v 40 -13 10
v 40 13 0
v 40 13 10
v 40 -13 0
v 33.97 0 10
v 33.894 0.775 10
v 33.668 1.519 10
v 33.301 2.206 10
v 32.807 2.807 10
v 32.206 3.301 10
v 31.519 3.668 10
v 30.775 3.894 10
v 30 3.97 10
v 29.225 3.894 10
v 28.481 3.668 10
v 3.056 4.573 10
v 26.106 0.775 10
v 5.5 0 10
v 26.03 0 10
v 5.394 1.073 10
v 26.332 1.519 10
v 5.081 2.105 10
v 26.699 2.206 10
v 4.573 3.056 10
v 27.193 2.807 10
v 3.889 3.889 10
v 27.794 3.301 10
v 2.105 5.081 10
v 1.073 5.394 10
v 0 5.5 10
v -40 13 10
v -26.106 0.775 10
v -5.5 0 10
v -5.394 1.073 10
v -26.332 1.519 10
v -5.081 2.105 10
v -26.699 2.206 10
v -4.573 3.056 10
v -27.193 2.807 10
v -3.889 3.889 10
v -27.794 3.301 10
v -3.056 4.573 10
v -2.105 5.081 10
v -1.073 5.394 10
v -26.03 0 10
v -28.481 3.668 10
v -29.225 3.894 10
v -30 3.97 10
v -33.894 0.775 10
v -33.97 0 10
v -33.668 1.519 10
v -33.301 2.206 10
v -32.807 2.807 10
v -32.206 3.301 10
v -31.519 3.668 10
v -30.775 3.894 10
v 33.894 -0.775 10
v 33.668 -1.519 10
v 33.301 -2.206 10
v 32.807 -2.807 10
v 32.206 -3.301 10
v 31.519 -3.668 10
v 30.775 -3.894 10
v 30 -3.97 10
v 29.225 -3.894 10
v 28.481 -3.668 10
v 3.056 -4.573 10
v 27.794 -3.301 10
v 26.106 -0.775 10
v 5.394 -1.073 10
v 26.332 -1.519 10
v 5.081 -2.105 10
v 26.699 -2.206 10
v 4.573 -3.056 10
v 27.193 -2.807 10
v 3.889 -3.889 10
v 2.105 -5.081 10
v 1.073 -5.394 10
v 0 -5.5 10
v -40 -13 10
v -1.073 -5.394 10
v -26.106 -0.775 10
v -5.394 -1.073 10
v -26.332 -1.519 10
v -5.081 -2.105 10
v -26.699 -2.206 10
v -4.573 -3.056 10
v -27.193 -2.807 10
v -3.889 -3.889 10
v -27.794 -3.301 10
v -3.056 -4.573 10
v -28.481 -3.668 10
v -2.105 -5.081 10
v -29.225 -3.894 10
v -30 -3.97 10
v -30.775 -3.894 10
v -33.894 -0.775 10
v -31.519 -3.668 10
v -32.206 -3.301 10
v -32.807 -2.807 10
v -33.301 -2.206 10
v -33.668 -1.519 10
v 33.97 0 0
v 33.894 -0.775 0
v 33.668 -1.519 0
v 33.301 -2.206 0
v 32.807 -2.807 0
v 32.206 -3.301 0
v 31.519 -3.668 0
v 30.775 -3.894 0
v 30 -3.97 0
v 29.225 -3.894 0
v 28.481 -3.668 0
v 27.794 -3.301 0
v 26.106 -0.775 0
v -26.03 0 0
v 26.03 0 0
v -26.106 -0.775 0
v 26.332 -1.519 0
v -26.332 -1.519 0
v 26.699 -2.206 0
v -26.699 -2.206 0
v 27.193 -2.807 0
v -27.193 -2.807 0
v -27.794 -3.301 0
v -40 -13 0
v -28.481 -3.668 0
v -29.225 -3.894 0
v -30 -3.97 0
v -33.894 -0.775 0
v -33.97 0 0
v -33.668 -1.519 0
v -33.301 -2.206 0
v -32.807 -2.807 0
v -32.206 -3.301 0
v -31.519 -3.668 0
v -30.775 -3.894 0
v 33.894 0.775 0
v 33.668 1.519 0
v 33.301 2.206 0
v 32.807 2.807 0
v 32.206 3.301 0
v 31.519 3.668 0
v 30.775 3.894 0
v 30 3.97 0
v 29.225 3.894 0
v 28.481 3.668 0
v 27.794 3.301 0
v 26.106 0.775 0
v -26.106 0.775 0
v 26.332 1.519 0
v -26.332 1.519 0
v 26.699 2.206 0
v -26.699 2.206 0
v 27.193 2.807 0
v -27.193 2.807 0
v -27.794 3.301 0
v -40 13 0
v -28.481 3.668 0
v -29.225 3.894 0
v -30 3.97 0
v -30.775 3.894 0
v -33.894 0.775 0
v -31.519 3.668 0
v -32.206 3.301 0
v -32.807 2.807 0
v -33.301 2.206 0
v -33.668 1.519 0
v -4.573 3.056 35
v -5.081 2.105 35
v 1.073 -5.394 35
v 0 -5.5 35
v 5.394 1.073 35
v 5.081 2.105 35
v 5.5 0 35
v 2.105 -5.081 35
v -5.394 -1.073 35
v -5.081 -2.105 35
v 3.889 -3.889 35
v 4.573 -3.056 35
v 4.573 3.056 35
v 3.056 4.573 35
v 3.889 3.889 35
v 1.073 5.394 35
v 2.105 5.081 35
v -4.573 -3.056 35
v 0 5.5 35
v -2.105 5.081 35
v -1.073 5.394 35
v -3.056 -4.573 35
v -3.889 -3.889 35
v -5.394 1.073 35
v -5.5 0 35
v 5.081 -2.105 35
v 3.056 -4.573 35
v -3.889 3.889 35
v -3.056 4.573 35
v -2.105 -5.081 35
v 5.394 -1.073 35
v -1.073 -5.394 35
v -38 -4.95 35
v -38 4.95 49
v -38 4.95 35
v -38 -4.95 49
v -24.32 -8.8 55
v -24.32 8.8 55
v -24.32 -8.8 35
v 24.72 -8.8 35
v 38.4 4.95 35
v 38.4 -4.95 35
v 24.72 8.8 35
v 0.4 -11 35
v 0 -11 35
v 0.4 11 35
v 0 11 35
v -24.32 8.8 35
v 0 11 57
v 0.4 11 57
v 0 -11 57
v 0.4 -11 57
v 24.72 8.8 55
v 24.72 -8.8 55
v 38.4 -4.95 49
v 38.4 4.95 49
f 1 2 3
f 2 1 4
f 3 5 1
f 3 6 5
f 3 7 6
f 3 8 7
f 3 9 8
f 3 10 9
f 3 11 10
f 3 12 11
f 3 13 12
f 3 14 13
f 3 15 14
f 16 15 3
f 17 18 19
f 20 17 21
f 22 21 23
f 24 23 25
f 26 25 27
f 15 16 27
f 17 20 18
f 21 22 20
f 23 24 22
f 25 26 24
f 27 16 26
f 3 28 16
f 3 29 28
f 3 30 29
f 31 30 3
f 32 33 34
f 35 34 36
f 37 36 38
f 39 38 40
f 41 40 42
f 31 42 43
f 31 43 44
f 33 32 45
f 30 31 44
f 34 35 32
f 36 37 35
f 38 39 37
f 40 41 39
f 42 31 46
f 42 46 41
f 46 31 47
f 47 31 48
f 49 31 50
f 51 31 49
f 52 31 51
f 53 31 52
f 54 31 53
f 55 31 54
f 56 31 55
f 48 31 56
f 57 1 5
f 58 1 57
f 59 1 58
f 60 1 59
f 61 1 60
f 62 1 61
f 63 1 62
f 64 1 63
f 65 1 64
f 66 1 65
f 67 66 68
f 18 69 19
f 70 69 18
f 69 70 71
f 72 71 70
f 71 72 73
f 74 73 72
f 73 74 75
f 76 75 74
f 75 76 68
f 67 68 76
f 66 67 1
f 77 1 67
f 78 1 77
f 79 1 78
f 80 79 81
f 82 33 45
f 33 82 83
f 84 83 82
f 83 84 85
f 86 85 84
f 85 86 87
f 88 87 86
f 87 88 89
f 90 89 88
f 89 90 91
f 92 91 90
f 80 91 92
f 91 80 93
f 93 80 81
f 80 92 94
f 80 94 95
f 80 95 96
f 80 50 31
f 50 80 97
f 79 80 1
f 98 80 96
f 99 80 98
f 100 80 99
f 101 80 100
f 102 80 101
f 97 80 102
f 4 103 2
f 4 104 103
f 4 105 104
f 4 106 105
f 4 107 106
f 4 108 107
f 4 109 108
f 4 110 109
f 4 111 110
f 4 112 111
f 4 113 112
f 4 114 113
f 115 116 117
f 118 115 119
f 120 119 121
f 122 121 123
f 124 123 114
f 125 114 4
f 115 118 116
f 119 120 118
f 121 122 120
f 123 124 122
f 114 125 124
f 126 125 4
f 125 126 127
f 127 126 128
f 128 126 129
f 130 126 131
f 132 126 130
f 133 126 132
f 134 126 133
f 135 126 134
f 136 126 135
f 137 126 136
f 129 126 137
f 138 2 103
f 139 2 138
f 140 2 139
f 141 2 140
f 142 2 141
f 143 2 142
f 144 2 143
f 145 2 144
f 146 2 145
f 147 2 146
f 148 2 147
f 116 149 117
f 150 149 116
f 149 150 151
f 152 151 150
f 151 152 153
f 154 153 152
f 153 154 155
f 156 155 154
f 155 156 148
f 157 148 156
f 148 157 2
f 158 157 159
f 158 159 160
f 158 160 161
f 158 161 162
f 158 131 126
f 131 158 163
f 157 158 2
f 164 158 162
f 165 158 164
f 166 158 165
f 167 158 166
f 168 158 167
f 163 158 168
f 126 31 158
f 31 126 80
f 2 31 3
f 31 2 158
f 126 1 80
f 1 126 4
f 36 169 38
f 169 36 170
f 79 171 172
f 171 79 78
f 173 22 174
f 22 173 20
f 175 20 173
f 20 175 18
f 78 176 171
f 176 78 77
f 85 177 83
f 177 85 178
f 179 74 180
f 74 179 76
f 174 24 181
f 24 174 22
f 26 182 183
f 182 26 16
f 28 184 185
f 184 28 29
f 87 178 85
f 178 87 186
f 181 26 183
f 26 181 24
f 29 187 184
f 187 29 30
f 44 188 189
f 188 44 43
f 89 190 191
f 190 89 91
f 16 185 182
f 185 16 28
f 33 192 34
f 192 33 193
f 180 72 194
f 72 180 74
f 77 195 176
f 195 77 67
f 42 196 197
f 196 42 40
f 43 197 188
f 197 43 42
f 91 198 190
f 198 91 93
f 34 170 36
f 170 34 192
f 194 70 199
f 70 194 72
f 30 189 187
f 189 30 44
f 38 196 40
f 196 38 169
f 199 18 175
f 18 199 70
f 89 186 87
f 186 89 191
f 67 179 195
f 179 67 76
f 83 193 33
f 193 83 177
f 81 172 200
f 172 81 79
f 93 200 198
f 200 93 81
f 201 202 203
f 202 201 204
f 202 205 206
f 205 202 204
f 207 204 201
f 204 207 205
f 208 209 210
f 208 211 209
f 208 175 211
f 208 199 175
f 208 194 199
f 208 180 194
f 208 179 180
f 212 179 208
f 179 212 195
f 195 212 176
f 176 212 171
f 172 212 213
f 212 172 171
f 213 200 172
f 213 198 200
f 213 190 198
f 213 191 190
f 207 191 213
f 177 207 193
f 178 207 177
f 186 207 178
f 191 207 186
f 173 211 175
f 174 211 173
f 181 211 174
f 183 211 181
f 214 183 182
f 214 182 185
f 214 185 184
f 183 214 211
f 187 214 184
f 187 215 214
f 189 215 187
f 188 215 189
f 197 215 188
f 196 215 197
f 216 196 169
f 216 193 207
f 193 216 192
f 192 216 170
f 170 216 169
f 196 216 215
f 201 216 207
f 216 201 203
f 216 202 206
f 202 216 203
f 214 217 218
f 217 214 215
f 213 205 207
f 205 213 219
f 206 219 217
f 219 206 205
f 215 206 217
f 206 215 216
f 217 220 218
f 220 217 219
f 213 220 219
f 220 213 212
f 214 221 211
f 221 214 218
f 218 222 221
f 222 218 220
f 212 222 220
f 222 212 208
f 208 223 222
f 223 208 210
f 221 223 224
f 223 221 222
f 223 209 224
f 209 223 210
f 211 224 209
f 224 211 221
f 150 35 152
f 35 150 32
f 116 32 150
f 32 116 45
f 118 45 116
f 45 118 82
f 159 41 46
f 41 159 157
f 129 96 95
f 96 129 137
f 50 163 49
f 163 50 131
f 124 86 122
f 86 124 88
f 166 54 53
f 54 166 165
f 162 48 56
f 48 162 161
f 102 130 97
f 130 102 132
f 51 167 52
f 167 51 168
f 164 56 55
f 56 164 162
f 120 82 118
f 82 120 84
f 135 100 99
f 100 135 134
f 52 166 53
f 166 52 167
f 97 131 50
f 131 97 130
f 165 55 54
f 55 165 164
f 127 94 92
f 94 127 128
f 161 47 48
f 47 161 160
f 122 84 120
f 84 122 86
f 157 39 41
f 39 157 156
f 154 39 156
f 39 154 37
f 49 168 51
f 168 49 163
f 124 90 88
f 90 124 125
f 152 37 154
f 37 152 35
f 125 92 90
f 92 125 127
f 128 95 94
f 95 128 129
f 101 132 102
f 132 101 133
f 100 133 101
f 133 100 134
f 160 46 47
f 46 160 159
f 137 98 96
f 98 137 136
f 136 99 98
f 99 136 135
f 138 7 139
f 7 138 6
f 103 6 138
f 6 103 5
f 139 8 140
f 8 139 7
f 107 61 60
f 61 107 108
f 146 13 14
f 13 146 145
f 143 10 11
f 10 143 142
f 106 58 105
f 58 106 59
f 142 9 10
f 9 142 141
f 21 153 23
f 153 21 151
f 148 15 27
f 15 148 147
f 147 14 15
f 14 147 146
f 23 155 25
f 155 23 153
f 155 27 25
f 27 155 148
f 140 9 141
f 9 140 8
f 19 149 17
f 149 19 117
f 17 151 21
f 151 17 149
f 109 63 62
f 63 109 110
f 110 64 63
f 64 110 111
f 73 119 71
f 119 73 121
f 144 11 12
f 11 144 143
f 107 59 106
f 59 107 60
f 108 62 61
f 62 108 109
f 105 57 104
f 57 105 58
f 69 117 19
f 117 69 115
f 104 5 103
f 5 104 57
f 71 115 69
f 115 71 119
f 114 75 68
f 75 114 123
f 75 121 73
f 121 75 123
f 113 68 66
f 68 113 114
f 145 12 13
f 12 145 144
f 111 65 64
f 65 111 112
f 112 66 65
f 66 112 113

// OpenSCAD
$fn = 32;

// ----------------------------------------------------------------------
// Boat cleat: 80 mm base, horn 46 mm up
// ----------------------------------------------------------------------

// --- parameters (mm) ---
base_l = 80;              // base length
base_w = 26;              // base width
base_t = 10;              // base thickness
horn_len = 76;            // horn length
horn_d = 22;              // horn diameter at the middle
horn_z = 46;              // horn axis height
end_drop = 8;             // how far the horn tips drop
post_d = 11;              // centre post diameter
holes_d = 7.94;           // fixing holes
hole_x = 30;              // fixing hole spacing

difference() {
  union() {
    translate([-40, -13, 0]) cube([base_l, base_w, base_t]);
    /* centre post, sunk 1 mm into the base */
    translate([0, 0, 9]) cylinder(h = 37, d = post_d);
    /* horn: a hull chain of boxes, full in the middle and lighter at the tips */
    hull() {
      translate([-38, -4.95, 35]) cube([0.4, 9.9, 14], center = false);
      translate([-24.32, -8.8, 35]) cube([0.4, 17.6, 20], center = false);
    }
    hull() {
      translate([-24.32, -8.8, 35]) cube([0.4, 17.6, 20], center = false);
      translate([0, -11, 35]) cube([0.4, 22, 22], center = false);
    }
    hull() {
      translate([0, -11, 35]) cube([0.4, 22, 22], center = false);
      translate([24.32, -8.8, 35]) cube([0.4, 17.6, 20], center = false);
    }
    hull() {
      translate([24.32, -8.8, 35]) cube([0.4, 17.6, 20], center = false);
      translate([38, -4.95, 35]) cube([0.4, 9.9, 14], center = false);
    }
  }
  translate([-30, 0, -2.5]) cylinder(h = base_t + 5, d = holes_d);
  translate([30, 0, -2.5]) cylinder(h = base_t + 5, d = holes_d);
}
